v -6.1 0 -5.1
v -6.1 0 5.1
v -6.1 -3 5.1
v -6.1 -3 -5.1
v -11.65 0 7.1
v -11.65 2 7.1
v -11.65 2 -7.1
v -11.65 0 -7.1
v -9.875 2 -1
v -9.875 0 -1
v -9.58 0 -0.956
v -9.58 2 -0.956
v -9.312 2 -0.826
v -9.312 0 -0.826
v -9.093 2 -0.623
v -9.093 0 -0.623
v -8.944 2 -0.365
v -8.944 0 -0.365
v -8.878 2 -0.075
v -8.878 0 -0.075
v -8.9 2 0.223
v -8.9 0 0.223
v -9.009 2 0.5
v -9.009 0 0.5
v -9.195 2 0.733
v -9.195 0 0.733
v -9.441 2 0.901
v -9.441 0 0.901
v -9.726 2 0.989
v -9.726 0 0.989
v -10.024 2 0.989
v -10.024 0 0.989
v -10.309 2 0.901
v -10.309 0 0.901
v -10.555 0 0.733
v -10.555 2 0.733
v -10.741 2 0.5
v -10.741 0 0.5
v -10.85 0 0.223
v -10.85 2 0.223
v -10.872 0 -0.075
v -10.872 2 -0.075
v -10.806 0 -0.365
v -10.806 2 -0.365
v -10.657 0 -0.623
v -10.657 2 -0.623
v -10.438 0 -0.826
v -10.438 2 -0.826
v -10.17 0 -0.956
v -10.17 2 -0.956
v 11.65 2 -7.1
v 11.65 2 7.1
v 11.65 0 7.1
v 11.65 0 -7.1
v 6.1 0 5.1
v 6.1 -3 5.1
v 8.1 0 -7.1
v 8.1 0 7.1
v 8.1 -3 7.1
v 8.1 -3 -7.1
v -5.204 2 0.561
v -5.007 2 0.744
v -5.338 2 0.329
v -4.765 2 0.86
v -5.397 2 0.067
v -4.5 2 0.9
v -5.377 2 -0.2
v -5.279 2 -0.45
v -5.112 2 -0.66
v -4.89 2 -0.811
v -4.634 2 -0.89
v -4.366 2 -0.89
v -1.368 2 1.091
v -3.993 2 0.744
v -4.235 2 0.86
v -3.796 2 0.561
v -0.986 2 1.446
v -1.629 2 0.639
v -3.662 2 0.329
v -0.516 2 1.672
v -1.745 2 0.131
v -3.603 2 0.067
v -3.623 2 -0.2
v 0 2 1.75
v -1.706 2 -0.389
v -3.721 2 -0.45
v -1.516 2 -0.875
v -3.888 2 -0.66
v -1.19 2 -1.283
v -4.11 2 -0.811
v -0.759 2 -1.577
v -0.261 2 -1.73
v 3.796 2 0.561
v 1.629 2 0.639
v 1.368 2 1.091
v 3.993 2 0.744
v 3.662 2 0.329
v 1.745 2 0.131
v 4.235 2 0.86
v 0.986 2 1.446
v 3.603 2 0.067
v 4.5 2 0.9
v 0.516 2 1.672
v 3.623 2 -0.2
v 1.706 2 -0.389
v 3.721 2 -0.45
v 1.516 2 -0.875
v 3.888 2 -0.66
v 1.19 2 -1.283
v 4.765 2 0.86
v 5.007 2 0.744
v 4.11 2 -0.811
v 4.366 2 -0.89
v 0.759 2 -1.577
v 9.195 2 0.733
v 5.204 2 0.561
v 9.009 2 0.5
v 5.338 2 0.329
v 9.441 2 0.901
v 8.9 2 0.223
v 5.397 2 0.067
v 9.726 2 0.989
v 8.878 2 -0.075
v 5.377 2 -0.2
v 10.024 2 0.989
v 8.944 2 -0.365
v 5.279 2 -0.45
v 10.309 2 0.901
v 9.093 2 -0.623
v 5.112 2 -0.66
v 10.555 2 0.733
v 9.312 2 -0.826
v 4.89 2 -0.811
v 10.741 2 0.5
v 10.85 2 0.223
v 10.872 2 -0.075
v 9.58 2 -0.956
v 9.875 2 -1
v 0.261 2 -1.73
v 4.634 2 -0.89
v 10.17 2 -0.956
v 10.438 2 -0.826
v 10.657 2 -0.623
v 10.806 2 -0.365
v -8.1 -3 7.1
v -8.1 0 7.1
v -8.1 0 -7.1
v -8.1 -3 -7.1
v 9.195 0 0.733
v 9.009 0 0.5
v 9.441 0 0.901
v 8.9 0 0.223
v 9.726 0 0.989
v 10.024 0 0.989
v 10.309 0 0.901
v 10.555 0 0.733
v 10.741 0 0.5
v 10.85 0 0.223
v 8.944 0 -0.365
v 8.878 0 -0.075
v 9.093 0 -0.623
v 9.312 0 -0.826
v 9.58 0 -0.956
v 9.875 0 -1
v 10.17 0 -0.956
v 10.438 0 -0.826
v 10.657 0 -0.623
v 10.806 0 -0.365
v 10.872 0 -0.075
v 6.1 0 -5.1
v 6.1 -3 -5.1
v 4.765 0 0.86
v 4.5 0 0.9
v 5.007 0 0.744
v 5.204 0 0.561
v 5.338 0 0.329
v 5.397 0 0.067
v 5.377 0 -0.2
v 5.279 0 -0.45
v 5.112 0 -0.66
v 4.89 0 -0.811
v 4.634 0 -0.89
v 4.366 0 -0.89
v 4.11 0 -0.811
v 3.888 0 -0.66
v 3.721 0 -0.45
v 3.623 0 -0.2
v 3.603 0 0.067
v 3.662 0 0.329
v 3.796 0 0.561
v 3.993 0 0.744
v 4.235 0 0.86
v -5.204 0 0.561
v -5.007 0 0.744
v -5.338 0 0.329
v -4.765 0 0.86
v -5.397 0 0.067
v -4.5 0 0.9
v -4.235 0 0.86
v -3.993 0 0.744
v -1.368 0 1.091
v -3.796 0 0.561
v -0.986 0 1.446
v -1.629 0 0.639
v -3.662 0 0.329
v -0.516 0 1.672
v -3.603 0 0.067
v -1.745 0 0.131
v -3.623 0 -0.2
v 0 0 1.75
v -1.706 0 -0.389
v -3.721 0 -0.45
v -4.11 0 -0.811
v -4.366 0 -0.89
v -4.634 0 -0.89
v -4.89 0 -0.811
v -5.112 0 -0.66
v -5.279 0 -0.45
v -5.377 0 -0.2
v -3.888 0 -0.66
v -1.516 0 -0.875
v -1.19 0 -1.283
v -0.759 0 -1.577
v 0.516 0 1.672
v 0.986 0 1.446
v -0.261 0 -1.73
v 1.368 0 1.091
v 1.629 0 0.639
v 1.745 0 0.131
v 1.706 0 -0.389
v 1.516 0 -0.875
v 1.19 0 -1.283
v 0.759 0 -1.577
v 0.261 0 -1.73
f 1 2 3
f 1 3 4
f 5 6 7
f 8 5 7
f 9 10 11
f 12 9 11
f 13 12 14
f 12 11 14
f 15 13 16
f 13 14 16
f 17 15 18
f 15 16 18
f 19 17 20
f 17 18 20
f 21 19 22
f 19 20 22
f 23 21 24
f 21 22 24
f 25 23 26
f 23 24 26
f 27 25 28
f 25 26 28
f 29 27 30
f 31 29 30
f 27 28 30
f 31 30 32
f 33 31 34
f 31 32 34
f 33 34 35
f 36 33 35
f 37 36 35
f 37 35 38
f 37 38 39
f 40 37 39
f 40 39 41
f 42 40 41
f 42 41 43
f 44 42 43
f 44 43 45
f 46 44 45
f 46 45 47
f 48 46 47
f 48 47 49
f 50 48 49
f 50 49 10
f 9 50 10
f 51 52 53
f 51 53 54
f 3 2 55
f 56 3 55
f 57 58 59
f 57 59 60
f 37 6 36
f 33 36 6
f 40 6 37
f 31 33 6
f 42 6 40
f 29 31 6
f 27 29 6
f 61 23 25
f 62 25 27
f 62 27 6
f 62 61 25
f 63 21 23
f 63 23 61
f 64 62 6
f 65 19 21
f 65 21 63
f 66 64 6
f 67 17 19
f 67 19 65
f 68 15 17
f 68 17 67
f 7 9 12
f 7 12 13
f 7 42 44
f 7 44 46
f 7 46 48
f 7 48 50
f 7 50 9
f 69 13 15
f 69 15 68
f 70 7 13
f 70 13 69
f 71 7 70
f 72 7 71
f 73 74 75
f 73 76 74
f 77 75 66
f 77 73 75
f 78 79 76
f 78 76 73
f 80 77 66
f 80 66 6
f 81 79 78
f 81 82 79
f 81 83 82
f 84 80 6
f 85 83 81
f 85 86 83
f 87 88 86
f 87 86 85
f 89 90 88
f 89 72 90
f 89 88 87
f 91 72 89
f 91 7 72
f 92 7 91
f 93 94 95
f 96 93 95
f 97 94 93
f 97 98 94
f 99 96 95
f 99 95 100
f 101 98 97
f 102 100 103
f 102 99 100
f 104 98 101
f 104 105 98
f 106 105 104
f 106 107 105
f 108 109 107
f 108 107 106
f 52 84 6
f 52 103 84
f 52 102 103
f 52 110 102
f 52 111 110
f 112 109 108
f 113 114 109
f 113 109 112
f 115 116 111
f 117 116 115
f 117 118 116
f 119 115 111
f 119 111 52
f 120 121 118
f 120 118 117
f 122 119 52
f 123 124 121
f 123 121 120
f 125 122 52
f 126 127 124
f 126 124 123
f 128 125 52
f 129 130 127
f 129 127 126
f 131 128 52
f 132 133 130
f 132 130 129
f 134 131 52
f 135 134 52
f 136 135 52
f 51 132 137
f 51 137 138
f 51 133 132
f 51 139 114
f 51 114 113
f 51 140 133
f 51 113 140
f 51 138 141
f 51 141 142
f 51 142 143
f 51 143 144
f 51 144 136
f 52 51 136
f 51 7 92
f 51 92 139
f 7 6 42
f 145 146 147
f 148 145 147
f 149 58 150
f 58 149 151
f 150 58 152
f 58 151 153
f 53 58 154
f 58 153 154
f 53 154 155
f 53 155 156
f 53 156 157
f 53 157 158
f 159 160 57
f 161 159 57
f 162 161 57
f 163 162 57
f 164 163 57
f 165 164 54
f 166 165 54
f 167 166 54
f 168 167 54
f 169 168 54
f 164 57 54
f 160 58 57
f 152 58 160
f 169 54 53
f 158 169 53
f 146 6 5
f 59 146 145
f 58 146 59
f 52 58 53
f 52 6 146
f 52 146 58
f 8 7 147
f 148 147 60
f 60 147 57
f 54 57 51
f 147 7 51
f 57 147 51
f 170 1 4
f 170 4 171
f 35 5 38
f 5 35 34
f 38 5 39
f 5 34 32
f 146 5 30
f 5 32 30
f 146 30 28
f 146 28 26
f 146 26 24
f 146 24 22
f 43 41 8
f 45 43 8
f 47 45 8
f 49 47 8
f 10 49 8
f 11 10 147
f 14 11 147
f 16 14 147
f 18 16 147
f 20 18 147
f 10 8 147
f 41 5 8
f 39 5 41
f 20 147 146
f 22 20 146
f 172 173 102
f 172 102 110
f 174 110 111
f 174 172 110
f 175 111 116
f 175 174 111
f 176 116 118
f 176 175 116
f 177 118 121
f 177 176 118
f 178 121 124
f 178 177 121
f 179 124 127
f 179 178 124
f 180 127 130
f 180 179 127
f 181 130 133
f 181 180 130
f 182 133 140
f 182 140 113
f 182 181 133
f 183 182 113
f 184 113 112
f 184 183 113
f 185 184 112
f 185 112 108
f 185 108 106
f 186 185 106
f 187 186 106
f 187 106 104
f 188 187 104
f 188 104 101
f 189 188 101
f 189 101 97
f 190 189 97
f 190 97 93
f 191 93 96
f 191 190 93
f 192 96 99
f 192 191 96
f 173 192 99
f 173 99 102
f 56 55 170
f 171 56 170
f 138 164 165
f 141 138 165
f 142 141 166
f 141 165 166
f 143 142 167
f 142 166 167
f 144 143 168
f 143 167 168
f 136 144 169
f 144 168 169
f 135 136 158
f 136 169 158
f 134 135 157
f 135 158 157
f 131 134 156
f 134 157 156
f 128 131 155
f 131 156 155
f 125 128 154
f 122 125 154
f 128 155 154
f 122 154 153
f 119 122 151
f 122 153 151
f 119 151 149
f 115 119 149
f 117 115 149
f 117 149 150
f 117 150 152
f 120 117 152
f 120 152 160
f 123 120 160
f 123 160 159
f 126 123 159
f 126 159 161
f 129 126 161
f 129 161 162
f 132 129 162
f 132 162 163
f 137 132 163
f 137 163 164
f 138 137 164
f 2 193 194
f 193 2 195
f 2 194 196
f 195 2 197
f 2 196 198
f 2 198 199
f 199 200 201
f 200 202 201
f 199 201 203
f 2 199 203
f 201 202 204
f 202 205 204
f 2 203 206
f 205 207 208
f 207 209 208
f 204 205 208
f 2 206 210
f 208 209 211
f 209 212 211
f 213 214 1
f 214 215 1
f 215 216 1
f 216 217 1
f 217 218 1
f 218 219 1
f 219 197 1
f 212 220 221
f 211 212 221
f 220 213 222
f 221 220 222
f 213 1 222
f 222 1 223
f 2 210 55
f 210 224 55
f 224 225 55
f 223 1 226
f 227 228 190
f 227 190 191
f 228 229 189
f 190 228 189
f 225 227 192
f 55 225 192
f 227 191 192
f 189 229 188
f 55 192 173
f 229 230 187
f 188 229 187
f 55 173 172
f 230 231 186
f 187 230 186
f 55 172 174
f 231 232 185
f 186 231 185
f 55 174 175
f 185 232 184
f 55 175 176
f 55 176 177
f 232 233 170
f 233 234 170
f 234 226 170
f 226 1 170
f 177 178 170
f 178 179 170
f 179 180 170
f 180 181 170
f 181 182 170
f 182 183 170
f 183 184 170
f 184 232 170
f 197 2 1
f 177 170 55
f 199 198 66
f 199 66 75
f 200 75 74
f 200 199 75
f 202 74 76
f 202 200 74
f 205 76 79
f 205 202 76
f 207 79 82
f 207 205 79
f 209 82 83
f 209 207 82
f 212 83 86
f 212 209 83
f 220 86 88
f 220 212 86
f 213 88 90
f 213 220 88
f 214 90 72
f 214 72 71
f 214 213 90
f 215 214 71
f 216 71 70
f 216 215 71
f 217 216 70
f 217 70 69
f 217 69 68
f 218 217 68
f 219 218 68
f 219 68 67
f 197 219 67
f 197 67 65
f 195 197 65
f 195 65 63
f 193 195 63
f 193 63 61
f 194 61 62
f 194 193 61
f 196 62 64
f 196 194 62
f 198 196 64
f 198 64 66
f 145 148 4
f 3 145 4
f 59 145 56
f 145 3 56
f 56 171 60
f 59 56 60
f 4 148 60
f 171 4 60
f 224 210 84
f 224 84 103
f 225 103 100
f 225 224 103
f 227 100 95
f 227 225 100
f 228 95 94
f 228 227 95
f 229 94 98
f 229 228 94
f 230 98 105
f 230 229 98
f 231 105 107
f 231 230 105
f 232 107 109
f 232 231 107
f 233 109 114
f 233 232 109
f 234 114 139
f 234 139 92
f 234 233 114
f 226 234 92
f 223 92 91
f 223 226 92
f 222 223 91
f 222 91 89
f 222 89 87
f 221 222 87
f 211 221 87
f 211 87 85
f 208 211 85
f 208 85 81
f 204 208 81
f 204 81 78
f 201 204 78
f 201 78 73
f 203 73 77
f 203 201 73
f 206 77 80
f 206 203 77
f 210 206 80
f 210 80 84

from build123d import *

# Parameters (mm, degrees)
SKETCH_4_W          = 16.2
SKETCH_4_H          = 14.2
SKETCH_4_R          = 0.9
SKETCH_4_R_2        = 1.75
EXTRUDE_1_DEPTH     = 2
SKETCH_4_8_W        = 16.2
SKETCH_4_8_H        = 14.2
SKETCH_4_8_W_2      = 12.2
SKETCH_4_8_H_2      = 10.2
EXTRUDE_2_DEPTH     = 3
SKETCH_5_W          = 23.3
SKETCH_5_H          = 14.2
SKETCH_5_W_2        = 12.2
SKETCH_5_H_2        = 10.2
EXTRUDE_3_DEPTH     = 2
SKETCH_6_R          = 1
CUT_EXTRUDE_1_DEPTH = 14.968983499


with BuildPart() as part:
    # 草图4 → 凸台-拉伸1 (new body)
    with BuildSketch(Plane(origin=(0, 0, 0), x_dir=(1, 0, 0), z_dir=(0, 1, 0))):
        Rectangle(SKETCH_4_W, SKETCH_4_H)
        with Locations((4.5, 0)):
            Circle(SKETCH_4_R, mode=Mode.SUBTRACT)
        with Locations((-4.5, 0)):
            Circle(SKETCH_4_R, mode=Mode.SUBTRACT)
        Circle(SKETCH_4_R_2, mode=Mode.SUBTRACT)
    extrude(amount=EXTRUDE_1_DEPTH)

    # 草图4<8> → 凸台-拉伸2 (add)
    with BuildSketch(Plane(origin=(0, 0, 0), x_dir=(1, 0, 0), z_dir=(0, 1, 0))):
        Rectangle(SKETCH_4_8_W, SKETCH_4_8_H)
        Rectangle(SKETCH_4_8_W_2, SKETCH_4_8_H_2, mode=Mode.SUBTRACT)
    extrude(amount=-EXTRUDE_2_DEPTH)

    # 草图5 → 凸台-拉伸3 (add)
    with BuildSketch(Plane(origin=(0, 2, 0), x_dir=(1, 0, 0), z_dir=(0, 1, 0))):
        Rectangle(SKETCH_5_W, SKETCH_5_H)
        Rectangle(SKETCH_5_W_2, SKETCH_5_H_2, mode=Mode.SUBTRACT)
    extrude(amount=-EXTRUDE_3_DEPTH)

    # 草图6 → 切除-拉伸1 (cut, through all)
    with BuildSketch(Plane(origin=(0, 0, 0), x_dir=(-1, 0, 0), z_dir=(0, -1, 0))):
        with Locations((-9.875, 0)):
            Circle(SKETCH_6_R)
        with Locations((9.875, 0)):
            Circle(SKETCH_6_R)
    extrude(amount=-CUT_EXTRUDE_1_DEPTH, mode=Mode.SUBTRACT)


solid = part.part
